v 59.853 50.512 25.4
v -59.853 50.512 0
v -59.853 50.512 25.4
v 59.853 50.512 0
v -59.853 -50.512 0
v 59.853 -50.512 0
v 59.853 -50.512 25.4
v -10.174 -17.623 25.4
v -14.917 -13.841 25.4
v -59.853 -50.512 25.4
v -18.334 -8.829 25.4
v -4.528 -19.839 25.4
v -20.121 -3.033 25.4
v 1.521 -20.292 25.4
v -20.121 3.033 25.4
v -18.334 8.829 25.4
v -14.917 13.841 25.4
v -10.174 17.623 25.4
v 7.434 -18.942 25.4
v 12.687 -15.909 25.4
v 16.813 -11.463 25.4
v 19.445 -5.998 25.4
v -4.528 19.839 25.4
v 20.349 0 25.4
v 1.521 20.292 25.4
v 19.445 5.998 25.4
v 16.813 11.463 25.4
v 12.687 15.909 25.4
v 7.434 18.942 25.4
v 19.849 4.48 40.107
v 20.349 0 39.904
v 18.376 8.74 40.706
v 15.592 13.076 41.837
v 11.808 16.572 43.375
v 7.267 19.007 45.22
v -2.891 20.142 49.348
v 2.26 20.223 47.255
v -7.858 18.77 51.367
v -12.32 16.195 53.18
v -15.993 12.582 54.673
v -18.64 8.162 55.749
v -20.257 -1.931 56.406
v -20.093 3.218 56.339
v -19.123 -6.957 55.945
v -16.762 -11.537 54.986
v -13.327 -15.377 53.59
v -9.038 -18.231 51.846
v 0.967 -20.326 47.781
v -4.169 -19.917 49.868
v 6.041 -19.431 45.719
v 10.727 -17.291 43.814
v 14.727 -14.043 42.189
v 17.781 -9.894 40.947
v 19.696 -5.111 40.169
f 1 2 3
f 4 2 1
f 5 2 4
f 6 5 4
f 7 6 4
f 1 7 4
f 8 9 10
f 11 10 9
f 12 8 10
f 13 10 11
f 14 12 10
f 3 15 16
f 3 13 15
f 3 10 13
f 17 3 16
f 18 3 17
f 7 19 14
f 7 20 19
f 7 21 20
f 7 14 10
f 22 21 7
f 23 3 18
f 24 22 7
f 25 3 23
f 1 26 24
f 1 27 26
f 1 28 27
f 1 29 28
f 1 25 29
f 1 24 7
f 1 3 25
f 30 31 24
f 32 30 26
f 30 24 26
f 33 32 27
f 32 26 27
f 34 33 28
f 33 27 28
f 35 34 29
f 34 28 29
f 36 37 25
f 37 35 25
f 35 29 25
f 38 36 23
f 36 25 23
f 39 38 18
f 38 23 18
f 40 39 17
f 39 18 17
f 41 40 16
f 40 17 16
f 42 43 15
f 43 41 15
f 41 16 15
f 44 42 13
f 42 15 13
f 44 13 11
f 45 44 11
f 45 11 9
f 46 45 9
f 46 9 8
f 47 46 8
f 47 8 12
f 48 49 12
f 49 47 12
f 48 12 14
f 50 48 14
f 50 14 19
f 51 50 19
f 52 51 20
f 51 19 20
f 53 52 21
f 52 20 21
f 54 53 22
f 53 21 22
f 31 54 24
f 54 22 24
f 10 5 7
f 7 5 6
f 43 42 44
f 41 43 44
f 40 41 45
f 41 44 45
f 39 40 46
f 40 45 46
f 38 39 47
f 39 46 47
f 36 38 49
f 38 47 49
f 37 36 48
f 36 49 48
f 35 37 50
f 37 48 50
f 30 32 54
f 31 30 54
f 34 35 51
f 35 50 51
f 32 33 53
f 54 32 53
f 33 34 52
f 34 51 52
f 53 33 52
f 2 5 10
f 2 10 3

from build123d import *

# Parameters (mm, degrees)
F0_W     = 119.706568
F0_H     = 101.024038
F1_DEPTH = 25.4
F2_R     = 20.348716
F3_DEPTH = 32.004
F5_DEPTH = 63.5


with BuildPart() as f1:
    # F0 (on Top) → F1 (new body)
    with BuildSketch(Plane.XY):
        Rectangle(F0_W, F0_H)
    extrude(amount=F1_DEPTH)

    # F2 (on face) → F3 (join)
    with BuildSketch(Plane.XY.offset(25.4)):
        Circle(F2_R)
    extrude(amount=F3_DEPTH)

    # F4 (on Front) → F5 (cut, symmetric)
    with BuildSketch(Plane.XZ):
        Polygon((24.732081, 57.519987), (-22.998786, 57.519987), (24.732081, 38.122512), align=None)
    extrude(amount=F5_DEPTH, both=True, mode=Mode.SUBTRACT)


solid = f1.part
